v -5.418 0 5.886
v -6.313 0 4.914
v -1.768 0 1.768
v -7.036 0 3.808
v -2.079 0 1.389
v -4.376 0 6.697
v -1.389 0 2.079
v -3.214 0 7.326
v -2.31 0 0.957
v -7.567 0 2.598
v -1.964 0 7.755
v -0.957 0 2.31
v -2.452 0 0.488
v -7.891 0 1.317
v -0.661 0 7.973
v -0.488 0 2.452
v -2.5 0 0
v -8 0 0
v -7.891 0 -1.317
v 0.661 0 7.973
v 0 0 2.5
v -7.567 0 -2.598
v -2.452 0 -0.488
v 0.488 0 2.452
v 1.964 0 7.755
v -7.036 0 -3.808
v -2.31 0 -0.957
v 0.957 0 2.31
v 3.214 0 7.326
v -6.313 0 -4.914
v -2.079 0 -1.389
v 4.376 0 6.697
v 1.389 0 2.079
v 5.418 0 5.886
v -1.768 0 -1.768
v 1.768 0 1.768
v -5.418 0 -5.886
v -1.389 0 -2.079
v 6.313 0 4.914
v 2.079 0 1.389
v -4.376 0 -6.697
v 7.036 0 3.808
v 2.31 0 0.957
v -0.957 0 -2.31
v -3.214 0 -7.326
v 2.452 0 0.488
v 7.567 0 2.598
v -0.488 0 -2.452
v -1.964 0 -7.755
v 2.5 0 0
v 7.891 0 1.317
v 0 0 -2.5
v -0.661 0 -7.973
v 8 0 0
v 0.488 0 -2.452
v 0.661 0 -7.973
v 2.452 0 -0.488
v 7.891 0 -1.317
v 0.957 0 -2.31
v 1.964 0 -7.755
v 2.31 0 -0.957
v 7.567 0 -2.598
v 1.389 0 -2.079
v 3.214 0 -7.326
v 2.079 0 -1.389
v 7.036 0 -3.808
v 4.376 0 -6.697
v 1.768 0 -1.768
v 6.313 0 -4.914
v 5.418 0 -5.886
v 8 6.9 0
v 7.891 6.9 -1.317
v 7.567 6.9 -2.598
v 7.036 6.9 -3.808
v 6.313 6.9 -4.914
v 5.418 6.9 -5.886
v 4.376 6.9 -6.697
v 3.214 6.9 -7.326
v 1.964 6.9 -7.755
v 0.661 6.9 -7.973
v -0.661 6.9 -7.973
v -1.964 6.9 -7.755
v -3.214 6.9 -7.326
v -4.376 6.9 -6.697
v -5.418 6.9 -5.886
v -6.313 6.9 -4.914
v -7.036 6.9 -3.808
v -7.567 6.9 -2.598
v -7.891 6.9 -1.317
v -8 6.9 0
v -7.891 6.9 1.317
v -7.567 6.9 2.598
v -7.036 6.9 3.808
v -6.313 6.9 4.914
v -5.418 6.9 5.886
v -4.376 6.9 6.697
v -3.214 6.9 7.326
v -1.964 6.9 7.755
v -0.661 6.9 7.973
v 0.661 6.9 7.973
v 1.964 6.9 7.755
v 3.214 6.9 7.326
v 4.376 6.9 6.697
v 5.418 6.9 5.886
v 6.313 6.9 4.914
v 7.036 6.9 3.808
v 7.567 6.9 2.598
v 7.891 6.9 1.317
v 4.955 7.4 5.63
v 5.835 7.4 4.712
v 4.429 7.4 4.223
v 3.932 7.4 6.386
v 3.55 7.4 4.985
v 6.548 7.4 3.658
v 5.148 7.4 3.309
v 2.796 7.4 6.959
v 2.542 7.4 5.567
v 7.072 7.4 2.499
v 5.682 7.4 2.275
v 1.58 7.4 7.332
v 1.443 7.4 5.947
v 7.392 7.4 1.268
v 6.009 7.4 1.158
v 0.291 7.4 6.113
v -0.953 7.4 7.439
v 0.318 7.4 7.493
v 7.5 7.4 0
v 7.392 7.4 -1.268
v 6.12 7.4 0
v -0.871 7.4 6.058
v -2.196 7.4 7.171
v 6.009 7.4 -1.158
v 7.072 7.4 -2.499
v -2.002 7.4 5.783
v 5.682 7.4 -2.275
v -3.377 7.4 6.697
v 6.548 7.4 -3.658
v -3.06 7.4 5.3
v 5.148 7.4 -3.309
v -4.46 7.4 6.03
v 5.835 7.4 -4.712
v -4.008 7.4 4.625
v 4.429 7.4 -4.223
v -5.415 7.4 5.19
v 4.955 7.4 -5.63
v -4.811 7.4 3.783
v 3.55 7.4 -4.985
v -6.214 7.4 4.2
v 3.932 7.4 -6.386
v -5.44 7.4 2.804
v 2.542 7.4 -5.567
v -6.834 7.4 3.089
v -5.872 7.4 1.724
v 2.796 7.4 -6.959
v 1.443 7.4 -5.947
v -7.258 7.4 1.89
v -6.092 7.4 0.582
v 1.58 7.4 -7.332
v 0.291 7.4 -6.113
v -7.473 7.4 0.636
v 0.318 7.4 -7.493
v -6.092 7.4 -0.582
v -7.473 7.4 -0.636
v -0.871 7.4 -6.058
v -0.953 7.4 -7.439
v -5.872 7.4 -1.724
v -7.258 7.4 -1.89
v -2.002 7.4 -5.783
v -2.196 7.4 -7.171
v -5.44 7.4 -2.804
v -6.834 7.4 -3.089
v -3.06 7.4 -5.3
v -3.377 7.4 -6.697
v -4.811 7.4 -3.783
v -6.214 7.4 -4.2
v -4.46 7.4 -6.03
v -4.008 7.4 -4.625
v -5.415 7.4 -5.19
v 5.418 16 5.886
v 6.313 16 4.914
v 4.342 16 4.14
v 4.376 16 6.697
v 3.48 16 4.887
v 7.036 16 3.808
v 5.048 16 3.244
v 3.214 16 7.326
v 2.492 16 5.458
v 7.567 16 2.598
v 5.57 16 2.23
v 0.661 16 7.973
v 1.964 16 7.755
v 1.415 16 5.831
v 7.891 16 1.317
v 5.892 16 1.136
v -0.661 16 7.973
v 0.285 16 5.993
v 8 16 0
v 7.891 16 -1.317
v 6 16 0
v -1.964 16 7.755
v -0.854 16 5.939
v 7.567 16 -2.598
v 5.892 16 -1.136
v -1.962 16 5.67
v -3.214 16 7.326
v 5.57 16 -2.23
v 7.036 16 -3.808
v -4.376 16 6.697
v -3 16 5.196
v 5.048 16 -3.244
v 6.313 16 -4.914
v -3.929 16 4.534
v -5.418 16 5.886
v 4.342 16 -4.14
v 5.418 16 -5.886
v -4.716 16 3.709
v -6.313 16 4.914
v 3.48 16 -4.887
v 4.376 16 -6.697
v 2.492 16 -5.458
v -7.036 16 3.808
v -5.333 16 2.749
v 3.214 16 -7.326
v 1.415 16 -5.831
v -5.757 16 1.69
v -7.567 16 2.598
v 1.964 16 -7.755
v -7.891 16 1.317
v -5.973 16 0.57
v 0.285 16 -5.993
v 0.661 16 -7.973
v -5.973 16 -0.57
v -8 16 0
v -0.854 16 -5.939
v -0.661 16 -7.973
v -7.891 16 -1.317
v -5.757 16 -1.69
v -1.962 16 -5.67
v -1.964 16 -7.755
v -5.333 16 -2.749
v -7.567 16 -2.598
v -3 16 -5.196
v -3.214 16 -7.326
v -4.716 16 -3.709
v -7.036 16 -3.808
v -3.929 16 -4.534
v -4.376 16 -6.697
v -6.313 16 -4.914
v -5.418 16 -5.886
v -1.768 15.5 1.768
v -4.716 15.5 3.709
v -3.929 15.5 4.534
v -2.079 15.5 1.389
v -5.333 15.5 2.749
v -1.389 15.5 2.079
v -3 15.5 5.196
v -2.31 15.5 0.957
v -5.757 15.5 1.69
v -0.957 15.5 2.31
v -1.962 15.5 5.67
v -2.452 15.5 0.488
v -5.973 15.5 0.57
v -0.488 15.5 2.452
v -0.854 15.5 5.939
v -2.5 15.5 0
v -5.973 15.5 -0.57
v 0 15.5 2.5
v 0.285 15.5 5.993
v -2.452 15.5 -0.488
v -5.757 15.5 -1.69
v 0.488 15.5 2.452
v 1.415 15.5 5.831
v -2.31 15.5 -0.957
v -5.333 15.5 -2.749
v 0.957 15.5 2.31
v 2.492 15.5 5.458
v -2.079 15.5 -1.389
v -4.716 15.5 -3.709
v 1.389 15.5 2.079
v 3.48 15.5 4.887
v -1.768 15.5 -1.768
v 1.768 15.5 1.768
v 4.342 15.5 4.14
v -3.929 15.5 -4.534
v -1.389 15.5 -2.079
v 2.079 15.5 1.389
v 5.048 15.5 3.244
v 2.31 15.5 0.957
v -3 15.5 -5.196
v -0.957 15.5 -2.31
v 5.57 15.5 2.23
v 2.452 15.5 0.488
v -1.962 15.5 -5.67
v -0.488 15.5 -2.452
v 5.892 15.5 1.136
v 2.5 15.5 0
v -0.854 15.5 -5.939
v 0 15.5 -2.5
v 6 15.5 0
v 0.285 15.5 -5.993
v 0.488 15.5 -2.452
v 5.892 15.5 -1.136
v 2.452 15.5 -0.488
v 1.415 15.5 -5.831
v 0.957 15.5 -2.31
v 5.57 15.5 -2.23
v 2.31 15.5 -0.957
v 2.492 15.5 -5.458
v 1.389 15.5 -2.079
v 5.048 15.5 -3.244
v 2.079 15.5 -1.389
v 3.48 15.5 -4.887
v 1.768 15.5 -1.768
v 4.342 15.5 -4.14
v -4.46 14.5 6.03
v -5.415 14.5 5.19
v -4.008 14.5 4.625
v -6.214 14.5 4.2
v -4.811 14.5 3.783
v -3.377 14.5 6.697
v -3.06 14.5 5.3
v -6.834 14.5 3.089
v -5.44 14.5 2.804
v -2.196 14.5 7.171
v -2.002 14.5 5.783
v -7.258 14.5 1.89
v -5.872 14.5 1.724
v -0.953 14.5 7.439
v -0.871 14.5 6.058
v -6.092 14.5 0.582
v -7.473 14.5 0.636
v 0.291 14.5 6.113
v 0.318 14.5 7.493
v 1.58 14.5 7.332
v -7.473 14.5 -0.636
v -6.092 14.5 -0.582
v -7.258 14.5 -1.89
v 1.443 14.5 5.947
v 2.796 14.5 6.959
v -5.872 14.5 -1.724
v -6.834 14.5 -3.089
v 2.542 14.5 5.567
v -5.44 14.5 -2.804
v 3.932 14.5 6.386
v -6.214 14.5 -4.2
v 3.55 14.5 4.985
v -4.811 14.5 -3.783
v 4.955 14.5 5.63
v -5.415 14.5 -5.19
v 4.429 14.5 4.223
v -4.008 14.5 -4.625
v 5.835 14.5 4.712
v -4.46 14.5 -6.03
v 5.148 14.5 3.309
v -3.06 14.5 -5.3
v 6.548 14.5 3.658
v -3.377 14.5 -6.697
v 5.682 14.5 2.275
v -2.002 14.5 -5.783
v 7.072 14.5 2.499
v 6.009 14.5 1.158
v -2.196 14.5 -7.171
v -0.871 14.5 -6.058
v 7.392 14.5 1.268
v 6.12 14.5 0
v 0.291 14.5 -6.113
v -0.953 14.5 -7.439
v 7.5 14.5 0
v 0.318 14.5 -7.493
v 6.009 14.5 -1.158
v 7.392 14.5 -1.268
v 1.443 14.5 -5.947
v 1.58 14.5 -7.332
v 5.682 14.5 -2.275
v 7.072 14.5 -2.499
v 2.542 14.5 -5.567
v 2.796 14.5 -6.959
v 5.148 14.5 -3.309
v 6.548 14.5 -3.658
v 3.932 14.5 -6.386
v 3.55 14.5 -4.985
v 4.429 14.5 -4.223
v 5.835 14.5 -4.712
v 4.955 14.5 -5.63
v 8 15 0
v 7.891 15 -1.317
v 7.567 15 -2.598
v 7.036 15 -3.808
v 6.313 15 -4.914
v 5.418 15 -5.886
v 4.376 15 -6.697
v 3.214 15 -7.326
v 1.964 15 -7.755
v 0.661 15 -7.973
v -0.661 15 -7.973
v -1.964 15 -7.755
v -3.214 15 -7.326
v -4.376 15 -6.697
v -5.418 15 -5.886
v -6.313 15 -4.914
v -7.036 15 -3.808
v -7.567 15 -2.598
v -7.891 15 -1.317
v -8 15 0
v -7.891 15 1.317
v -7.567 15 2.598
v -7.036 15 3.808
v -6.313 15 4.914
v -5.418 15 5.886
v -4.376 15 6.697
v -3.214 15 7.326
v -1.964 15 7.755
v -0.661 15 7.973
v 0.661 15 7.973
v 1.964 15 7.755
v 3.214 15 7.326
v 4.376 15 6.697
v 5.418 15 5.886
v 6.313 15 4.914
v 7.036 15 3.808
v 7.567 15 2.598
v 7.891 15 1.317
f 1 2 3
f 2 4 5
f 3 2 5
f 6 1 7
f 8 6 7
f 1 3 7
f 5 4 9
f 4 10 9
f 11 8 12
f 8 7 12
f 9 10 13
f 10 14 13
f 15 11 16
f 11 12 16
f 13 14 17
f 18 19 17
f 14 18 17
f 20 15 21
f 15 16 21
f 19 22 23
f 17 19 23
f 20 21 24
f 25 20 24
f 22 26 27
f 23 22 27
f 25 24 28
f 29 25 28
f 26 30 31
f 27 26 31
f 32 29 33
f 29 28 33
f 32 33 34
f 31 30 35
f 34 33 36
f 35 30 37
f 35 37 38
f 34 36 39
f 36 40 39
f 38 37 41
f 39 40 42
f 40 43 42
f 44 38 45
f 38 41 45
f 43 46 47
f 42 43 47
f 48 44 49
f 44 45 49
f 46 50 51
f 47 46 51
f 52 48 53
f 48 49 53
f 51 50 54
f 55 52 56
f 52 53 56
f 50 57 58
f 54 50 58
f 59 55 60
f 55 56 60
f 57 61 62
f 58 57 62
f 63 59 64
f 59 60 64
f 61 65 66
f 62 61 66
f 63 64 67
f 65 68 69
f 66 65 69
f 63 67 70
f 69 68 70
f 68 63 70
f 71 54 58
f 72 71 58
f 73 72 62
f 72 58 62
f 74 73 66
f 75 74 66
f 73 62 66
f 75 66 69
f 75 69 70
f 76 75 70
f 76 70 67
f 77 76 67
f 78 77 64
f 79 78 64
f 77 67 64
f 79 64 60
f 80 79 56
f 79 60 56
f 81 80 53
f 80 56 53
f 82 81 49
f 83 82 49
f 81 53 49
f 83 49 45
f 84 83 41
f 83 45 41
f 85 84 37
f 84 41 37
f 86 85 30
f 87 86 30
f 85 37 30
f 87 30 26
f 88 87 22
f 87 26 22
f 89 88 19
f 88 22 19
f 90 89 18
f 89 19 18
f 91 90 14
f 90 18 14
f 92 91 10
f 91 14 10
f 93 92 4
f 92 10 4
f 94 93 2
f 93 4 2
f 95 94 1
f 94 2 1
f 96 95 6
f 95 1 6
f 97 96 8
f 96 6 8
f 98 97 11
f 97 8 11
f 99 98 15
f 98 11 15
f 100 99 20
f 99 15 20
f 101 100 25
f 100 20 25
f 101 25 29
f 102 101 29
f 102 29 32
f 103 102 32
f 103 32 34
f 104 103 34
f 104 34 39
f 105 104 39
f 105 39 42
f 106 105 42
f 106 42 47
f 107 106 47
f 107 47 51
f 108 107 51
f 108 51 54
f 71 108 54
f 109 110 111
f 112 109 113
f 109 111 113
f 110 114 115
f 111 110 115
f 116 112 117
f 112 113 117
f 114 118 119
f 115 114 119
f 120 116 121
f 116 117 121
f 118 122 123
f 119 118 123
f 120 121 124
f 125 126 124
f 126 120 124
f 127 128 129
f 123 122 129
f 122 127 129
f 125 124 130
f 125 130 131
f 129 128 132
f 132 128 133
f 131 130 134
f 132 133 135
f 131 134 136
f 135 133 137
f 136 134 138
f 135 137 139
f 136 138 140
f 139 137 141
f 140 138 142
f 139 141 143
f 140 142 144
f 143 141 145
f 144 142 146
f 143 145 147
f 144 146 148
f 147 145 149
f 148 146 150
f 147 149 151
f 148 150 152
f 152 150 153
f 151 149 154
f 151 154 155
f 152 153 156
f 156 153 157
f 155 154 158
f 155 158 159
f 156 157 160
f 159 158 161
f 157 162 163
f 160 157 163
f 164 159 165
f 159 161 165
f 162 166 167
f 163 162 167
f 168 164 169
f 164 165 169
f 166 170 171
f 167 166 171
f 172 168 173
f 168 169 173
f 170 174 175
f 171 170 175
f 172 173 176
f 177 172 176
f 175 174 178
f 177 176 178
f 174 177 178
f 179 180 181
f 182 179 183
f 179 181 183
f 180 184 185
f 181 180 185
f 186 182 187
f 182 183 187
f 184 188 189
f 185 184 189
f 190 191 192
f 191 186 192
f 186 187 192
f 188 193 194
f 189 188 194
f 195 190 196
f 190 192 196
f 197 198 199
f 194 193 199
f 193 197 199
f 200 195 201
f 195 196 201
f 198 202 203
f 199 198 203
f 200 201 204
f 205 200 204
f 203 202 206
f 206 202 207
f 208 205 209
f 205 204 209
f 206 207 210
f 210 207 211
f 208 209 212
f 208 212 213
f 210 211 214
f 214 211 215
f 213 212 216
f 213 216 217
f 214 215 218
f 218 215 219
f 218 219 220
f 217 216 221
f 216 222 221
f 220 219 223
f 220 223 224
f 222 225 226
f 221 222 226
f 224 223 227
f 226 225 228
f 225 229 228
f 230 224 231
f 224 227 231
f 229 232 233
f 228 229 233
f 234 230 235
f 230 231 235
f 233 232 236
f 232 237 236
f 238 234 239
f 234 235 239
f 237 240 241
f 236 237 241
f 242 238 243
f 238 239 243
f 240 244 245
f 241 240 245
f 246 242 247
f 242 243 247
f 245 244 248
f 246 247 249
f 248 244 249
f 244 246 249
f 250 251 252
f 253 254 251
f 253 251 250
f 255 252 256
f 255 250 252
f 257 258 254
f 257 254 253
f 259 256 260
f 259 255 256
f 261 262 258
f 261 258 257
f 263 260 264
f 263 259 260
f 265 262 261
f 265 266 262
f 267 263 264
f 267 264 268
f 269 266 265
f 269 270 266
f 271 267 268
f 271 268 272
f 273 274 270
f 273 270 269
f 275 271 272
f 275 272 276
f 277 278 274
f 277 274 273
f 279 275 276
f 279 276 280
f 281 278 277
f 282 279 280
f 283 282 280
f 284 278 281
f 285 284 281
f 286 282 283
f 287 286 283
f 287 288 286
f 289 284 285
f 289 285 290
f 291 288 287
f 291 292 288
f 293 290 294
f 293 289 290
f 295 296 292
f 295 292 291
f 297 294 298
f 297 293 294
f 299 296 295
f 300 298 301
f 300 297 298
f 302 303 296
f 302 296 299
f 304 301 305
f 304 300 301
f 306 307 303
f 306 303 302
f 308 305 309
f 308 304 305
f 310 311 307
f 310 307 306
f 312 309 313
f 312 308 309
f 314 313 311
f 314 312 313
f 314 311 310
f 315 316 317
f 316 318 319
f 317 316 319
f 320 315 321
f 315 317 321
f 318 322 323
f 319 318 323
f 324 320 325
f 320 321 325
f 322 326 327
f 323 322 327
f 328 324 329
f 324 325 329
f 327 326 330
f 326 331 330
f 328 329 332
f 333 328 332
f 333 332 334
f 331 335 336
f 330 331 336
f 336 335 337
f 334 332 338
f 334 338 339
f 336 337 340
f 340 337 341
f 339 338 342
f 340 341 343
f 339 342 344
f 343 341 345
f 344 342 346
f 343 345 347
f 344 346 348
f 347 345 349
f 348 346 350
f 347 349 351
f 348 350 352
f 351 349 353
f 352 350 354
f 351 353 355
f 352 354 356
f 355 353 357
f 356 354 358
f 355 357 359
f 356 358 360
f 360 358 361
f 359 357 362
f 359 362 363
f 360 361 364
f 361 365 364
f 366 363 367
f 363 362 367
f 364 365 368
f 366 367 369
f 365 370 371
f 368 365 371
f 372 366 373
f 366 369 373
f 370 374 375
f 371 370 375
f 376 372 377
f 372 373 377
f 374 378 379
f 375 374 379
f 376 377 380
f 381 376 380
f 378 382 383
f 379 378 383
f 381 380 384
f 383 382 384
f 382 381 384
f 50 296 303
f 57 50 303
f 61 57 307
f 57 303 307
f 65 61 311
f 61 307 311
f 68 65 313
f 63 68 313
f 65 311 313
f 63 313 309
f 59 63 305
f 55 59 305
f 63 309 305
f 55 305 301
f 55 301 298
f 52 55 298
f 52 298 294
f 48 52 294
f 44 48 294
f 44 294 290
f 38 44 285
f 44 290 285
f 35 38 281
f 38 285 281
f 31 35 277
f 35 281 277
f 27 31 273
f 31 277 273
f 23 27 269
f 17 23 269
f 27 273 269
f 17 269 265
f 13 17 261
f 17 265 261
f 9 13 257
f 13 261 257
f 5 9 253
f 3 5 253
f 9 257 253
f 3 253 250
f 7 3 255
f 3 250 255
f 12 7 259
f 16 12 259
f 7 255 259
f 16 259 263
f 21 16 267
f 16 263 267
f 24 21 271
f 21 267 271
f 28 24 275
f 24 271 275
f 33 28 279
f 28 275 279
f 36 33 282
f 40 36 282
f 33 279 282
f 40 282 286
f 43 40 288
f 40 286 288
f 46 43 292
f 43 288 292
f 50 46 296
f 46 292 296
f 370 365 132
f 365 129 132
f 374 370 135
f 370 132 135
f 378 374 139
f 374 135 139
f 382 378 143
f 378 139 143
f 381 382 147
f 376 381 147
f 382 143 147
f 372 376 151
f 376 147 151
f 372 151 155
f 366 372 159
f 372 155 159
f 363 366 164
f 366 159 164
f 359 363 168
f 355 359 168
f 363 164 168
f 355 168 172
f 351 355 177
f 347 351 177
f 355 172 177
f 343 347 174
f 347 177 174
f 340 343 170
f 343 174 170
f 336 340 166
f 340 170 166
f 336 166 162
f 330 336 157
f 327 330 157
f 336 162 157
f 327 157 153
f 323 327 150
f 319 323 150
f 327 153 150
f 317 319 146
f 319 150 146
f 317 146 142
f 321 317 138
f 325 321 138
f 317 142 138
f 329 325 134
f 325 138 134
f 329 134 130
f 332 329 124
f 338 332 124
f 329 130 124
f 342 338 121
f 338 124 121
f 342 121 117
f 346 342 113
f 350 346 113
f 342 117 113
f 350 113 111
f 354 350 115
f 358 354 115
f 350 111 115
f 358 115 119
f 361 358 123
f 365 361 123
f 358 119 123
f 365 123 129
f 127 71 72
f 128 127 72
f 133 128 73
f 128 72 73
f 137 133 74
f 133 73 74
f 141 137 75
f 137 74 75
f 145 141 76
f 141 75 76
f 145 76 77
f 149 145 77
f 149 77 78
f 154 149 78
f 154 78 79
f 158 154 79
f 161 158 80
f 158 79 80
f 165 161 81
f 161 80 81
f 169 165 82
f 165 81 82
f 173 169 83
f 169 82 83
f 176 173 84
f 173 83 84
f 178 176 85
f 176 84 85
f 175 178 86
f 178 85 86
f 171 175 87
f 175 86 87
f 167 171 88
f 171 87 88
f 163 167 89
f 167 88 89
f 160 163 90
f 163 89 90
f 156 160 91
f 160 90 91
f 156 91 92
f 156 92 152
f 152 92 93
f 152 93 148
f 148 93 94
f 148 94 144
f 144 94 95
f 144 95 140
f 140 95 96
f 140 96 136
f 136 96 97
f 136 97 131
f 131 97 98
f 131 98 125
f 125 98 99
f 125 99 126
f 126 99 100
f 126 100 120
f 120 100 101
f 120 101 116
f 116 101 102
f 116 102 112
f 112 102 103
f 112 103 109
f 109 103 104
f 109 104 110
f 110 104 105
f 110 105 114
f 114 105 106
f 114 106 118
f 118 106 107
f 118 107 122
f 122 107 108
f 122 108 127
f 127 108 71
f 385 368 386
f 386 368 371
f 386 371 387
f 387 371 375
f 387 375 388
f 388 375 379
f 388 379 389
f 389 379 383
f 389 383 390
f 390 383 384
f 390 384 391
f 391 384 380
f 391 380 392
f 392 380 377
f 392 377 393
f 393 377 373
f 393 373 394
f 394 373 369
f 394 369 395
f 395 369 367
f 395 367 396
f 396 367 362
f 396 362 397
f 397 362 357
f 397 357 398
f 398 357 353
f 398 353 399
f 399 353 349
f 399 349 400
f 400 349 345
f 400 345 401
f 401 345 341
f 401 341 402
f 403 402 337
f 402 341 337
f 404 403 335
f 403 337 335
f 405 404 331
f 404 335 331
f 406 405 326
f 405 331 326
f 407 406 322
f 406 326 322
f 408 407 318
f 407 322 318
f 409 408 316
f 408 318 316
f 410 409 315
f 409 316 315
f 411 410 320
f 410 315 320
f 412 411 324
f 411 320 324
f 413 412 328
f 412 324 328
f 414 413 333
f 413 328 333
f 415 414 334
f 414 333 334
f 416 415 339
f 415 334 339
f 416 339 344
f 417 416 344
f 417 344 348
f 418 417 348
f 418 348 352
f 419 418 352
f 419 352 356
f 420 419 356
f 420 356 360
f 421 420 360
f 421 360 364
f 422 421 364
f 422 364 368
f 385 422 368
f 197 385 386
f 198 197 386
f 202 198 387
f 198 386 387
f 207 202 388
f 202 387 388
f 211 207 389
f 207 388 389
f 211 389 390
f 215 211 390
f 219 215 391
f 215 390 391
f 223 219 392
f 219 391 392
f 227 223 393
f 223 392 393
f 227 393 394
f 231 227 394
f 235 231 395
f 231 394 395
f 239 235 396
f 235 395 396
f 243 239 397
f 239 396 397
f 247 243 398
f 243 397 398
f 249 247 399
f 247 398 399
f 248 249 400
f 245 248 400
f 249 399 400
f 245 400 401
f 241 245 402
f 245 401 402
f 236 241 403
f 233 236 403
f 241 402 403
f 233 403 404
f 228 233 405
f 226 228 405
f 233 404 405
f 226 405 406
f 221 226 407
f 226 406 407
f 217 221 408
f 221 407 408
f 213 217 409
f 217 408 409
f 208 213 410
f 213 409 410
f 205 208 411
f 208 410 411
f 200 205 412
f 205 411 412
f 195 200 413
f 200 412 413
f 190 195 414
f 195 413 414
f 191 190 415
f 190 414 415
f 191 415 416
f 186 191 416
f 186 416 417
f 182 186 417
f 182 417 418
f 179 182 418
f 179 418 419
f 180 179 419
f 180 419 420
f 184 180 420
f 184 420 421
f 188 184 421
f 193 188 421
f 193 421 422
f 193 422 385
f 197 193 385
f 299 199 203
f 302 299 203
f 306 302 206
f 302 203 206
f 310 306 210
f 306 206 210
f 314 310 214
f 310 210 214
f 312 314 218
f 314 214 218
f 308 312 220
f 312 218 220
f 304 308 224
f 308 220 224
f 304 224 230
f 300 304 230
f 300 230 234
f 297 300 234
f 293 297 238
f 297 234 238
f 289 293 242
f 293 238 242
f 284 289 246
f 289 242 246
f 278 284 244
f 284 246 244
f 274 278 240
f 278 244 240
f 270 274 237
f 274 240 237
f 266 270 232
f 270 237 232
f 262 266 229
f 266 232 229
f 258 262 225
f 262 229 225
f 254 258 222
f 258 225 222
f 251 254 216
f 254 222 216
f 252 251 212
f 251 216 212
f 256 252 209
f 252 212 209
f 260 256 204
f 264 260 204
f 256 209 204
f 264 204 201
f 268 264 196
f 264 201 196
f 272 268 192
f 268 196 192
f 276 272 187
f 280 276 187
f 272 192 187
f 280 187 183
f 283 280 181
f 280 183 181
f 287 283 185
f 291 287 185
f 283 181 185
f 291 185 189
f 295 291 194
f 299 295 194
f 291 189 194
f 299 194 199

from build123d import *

# Parameters (mm, degrees)
CHAMFER1_SIZE      = 0.5
SKETCH2_R          = 6
CUT_EXTRUDE1_DEPTH = 0.5


with BuildPart() as part:
    # Sketch1 → Revolve1 (revolve)
    with BuildSketch(Plane.XY):
        Polygon((2.5, 0), (2.5, 16), (8, 16), (8, 14.5), (6.12, 14.5), (6.12, 7.4), (8, 7.4), (8, 0), align=None)
    revolve(axis=Axis((0, 0, 0), (0, 1, 0)))

    # Chamfer1
    chamfer1_edges = [part.edges().sort_by_distance(p)[0] for p in [
        (-8, 7.4, 0),
        (-8, 14.5, 0),
    ]]
    chamfer(chamfer1_edges, length=CHAMFER1_SIZE)

    # Sketch2 → Cut-Extrude1 (cut)
    with BuildSketch(Plane(origin=(0, 16, 0), x_dir=(1, 0, 0), z_dir=(0, 1, 0))):
        Circle(SKETCH2_R)
    extrude(amount=-CUT_EXTRUDE1_DEPTH, mode=Mode.SUBTRACT)


solid = part.part
